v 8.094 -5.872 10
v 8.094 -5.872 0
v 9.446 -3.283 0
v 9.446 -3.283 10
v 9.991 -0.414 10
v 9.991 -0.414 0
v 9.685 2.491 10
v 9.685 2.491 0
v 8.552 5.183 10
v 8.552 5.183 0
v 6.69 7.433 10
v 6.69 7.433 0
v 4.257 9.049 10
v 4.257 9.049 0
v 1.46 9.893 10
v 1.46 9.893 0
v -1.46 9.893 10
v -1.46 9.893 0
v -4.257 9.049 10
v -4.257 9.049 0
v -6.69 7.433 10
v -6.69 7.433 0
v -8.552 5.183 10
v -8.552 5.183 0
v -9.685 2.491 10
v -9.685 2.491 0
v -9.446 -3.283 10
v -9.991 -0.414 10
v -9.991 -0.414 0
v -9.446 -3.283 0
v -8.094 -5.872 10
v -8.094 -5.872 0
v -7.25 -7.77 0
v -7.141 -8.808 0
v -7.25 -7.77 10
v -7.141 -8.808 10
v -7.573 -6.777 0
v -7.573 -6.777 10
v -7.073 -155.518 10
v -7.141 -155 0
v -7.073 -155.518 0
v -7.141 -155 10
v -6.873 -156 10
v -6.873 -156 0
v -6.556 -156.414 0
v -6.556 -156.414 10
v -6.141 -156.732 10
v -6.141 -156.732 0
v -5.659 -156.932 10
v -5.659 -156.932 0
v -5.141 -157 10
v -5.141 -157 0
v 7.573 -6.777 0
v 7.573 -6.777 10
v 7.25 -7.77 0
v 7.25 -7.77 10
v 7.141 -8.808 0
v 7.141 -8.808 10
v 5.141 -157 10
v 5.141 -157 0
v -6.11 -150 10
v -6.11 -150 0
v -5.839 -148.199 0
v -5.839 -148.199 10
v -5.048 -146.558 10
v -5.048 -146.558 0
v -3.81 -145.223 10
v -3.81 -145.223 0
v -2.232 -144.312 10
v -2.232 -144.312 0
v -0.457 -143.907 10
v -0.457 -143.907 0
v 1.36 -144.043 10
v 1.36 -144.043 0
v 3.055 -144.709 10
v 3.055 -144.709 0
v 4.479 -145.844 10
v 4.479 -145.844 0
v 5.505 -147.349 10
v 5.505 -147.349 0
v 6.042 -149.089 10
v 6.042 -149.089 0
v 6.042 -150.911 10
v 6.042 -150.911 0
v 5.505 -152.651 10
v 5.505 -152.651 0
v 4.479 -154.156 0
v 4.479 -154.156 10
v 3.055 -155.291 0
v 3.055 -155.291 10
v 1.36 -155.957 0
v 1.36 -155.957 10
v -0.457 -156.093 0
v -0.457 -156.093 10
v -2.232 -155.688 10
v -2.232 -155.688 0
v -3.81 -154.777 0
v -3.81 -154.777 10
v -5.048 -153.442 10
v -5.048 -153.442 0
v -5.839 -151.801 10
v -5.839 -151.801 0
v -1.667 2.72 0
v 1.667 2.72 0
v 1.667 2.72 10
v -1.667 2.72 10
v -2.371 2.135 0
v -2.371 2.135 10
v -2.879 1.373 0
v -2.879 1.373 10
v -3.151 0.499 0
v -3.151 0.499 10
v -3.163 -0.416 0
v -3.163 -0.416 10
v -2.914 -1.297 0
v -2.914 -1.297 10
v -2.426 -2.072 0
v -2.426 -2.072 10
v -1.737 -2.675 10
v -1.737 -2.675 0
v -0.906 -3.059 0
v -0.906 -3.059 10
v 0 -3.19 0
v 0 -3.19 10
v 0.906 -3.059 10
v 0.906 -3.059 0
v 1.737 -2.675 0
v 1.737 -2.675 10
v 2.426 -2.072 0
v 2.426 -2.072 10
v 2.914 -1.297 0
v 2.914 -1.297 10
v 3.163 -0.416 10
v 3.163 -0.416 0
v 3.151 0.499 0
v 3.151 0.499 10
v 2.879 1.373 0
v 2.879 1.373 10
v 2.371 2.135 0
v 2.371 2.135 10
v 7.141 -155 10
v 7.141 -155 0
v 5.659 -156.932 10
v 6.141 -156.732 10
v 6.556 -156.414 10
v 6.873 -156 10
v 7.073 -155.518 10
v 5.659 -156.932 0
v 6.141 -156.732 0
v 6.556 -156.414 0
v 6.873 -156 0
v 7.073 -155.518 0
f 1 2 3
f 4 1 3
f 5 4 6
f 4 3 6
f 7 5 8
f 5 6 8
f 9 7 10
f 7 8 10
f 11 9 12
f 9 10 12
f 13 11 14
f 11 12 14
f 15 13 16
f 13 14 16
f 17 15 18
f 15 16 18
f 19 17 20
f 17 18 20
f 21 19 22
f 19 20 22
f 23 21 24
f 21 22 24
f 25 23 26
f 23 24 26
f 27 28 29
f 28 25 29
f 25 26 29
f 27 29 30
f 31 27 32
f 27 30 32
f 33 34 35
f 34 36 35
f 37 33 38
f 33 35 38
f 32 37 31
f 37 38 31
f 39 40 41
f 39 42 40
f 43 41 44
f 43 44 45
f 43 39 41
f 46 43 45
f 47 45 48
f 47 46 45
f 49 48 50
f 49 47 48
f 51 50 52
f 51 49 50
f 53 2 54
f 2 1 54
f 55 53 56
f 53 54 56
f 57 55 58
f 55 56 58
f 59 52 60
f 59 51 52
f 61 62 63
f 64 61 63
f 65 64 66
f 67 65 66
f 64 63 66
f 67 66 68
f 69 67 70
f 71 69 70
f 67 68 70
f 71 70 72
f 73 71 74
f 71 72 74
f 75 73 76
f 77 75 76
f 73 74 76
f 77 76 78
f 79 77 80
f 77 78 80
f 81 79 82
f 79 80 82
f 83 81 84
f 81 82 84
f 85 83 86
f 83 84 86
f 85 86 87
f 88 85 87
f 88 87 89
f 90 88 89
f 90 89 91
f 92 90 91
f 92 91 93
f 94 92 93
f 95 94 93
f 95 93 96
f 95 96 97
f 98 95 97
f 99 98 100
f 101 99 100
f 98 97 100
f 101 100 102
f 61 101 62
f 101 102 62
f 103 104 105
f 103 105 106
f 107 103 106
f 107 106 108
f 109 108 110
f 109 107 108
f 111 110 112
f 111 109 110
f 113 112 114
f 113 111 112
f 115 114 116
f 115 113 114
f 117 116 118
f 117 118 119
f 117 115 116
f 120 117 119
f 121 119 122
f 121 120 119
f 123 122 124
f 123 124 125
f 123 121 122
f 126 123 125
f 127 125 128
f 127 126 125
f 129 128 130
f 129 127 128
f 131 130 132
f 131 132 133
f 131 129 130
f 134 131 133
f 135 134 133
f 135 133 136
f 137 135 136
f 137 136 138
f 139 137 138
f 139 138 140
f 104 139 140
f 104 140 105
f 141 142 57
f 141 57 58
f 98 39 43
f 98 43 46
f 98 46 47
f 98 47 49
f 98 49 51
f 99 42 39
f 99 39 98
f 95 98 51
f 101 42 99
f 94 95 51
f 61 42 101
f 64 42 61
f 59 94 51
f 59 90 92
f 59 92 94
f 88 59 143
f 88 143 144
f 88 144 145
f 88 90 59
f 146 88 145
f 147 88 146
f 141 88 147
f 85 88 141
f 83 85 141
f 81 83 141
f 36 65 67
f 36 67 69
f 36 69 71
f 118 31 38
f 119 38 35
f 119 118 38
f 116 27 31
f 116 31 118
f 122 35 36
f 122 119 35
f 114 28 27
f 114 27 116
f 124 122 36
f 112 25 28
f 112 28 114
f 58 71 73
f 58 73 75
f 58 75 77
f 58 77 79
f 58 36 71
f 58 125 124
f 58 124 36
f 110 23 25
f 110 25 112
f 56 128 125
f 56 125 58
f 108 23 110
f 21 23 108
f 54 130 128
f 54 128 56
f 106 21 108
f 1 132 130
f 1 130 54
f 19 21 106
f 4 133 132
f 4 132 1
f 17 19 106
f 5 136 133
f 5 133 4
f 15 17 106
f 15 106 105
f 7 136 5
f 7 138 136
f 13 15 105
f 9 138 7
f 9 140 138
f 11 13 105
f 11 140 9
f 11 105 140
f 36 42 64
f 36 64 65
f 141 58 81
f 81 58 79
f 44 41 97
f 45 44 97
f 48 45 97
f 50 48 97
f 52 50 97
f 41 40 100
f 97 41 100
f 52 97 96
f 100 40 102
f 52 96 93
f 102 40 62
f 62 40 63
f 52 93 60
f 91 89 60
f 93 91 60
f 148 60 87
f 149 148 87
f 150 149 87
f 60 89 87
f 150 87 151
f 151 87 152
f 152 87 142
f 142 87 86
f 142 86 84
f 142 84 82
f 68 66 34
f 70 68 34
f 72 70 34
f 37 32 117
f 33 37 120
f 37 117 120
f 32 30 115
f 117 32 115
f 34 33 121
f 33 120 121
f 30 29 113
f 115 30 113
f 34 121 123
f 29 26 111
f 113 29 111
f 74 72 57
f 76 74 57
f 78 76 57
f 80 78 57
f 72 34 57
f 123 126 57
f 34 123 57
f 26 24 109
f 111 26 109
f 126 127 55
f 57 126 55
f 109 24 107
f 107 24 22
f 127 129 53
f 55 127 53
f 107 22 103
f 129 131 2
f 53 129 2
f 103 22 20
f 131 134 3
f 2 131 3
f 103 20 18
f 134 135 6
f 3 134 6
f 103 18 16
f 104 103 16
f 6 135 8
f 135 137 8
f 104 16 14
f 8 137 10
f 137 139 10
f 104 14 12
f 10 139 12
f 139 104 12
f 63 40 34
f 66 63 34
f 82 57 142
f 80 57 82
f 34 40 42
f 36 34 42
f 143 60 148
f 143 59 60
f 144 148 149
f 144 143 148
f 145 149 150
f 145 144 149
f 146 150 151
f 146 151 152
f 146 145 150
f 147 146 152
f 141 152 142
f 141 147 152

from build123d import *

# Parameters (mm, degrees)
SKETCH1_R           = 10
BOSS_EXTRUDE1_DEPTH = 10
CUT_EXTRUDE1_DEPTH  = 10
SKETCH3_W           = 14.282856858
SKETCH3_H           = 10
BOSS_EXTRUDE2_DEPTH = 150
SKETCH4_R           = 6.11
CUT_EXTRUDE2_DEPTH  = 10
FILLET1_R           = 5
FILLET2_R           = 2


with BuildPart() as part:
    # Sketch1 → Boss-Extrude1 (new body)
    with BuildSketch(Plane.XY):
        Circle(SKETCH1_R)
        with BuildLine():
            ThreePointArc((-1.666643333, 2.72), (0, -3.19), (1.666643333, 2.72))
            Line((1.666643333, 2.72), (-1.666643333, 2.72))
        make_face(mode=Mode.SUBTRACT)
    extrude(amount=BOSS_EXTRUDE1_DEPTH)

    # Sketch2 → Cut-Extrude1 (cut)
    with BuildSketch(Plane(origin=(0, 0, 0), x_dir=(-1, 0, 0), z_dir=(0, 0, -1))):
        with BuildLine():
            Line((7.141428429, -7), (-7.141428429, -7))
            ThreePointArc((-7.141428429, -7), (-3.872983346, -9.219544457), (0, -10))
            ThreePointArc((0, -10), (3.872983346, -9.219544457), (7.141428429, -7))
        make_face()
    extrude(amount=-CUT_EXTRUDE1_DEPTH, mode=Mode.SUBTRACT)

    # Sketch3 → Boss-Extrude2 (add)
    with BuildSketch(Plane.XZ.offset(7)):
        with Locations((0, 5)):
            Rectangle(SKETCH3_W, SKETCH3_H)
    extrude(amount=BOSS_EXTRUDE2_DEPTH)

    # Sketch4 → Cut-Extrude2 (cut)
    with BuildSketch(Plane(origin=(0, 0, 0), x_dir=(-1, 0, 0), z_dir=(0, 0, -1))):
        with Locations((0, -150)):
            Circle(SKETCH4_R)
    extrude(amount=-CUT_EXTRUDE2_DEPTH, mode=Mode.SUBTRACT)

    # Fillet1
    fillet1_edges = [part.edges().sort_by_distance(p)[0] for p in [
        (7.141428429, -7, 5),
        (-7.141428429, -7, 5),
    ]]
    fillet(fillet1_edges, radius=FILLET1_R)

    # Fillet2
    fillet2_edges = [part.edges().sort_by_distance(p)[0] for p in [
        (-7.141428429, -157, 5),
        (7.141428429, -157, 5),
    ]]
    fillet(fillet2_edges, radius=FILLET2_R)


solid = part.part
